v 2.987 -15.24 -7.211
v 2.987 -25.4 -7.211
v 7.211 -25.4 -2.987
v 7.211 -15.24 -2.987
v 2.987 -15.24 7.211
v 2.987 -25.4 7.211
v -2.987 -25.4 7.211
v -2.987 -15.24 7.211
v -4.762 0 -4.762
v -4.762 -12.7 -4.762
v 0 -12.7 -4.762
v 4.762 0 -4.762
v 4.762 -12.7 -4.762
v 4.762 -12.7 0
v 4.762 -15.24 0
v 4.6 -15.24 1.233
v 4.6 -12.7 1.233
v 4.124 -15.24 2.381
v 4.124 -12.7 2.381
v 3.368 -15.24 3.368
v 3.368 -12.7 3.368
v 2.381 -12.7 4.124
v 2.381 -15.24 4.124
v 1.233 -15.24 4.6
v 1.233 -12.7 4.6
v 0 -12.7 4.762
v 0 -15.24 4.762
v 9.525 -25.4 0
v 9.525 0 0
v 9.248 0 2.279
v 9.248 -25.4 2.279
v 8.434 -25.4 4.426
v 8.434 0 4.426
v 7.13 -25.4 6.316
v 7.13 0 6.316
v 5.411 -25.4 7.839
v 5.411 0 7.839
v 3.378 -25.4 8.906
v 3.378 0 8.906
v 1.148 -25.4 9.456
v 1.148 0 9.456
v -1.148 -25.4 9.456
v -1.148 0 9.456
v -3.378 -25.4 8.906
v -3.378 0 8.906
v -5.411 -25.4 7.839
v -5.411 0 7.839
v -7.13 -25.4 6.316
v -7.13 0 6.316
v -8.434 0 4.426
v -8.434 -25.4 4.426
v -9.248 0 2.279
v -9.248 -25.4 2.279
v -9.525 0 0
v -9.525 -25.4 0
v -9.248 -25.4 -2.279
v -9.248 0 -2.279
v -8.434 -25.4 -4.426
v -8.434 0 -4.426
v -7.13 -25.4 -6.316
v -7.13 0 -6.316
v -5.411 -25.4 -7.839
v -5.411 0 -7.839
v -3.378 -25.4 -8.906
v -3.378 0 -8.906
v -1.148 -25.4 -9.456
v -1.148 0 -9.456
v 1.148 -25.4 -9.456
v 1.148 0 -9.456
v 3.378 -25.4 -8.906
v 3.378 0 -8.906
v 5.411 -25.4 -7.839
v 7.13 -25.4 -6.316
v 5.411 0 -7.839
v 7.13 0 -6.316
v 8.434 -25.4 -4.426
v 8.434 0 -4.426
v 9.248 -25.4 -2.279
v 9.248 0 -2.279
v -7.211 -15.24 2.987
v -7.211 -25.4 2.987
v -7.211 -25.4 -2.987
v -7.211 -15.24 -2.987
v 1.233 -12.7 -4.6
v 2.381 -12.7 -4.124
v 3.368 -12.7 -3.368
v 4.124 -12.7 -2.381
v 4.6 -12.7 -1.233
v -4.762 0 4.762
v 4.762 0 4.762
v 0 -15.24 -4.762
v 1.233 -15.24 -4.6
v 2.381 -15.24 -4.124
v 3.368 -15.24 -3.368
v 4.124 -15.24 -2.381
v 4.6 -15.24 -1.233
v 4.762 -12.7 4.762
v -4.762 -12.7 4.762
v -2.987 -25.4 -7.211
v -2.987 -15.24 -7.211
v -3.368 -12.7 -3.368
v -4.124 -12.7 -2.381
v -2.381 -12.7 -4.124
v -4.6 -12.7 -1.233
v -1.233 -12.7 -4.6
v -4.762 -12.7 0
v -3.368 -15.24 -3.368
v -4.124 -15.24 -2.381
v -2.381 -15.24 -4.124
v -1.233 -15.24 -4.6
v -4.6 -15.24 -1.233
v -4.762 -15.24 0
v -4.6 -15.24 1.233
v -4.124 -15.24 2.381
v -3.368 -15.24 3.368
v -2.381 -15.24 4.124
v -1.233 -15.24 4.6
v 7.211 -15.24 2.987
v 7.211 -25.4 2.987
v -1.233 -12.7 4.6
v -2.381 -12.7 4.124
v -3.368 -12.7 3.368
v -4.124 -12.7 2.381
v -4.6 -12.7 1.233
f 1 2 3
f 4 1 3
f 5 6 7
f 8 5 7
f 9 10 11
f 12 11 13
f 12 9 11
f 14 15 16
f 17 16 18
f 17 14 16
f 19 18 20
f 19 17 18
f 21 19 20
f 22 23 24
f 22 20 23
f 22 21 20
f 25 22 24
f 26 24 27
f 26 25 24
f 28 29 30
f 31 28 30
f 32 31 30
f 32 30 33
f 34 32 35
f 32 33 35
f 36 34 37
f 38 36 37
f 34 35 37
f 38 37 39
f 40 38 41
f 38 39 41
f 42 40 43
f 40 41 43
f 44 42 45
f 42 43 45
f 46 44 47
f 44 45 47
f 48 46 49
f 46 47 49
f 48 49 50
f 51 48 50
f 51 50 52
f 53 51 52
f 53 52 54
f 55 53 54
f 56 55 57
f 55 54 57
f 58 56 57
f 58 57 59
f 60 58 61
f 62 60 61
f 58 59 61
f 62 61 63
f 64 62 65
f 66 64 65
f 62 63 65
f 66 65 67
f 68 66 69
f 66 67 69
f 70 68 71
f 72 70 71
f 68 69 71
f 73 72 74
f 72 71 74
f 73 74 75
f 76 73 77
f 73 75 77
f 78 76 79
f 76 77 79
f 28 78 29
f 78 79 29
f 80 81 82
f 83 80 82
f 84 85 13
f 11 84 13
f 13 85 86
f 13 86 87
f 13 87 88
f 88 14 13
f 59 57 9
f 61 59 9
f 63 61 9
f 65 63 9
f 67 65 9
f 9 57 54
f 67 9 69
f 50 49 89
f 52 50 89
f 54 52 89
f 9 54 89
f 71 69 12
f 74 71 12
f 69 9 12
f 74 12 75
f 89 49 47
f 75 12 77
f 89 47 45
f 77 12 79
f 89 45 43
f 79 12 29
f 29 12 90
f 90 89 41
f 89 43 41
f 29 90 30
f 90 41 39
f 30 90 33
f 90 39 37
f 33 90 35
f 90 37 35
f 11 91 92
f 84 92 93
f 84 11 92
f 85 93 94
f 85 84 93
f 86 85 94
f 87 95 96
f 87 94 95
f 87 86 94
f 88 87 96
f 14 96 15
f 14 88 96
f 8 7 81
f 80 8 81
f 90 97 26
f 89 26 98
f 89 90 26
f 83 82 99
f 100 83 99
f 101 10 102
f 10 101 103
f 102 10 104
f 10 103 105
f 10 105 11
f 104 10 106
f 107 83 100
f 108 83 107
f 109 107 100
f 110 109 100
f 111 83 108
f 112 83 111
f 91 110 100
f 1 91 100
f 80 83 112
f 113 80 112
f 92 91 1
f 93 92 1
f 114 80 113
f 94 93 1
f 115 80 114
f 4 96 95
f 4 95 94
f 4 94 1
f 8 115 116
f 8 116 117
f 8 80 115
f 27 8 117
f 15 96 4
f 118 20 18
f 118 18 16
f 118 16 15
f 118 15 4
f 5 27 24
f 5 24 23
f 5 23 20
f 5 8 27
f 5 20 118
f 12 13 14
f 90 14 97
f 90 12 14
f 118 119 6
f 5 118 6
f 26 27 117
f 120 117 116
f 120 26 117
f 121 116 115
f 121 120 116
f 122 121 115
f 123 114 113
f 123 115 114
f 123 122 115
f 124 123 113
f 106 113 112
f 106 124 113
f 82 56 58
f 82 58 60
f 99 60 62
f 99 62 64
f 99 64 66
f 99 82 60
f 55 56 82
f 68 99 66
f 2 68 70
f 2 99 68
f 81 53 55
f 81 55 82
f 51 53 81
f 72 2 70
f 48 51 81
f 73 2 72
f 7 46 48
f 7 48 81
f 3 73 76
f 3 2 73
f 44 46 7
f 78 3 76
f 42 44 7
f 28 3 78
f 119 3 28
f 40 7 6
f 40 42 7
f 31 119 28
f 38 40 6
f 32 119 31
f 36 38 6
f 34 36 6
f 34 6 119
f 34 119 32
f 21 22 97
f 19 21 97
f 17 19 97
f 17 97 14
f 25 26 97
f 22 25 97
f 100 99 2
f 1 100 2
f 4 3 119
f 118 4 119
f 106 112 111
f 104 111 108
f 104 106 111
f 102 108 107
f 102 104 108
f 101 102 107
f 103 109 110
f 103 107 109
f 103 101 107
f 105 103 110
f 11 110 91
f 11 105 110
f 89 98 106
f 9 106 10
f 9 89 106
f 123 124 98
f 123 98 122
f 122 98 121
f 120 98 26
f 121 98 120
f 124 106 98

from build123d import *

# Parameters (mm, degrees)
F0_R     = 9.525
F1_DEPTH = 25.4
F3_DEPTH = 25.401
F4_DEPTH = 12.7
F6_DEPTH = 10.16


with BuildPart() as f1:
    # F0 (on Front) → F1 (new body)
    with BuildSketch(Plane.XZ):
        Circle(F0_R)
    extrude(amount=F1_DEPTH)

    # F2 (on Front) → F3 (cut, through all)
    with BuildSketch(Plane.XZ):
        with BuildLine():
            ThreePointArc((4.7625, 0), (3.367596, 3.367596), (0, 4.7625))
            ThreePointArc((0, 4.7625), (-3.367596, 3.367596), (-4.7625, 0))
            ThreePointArc((-4.7625, 0), (-3.367596, -3.367596), (0, -4.7625))
            ThreePointArc((0, -4.7625), (3.367596, -3.367596), (4.7625, 0))
        make_face()
    extrude(amount=F3_DEPTH, mode=Mode.SUBTRACT)

    # F2 (on Front) → F4 (cut)
    with BuildSketch(Plane.XZ):
        with BuildLine():
            Line((4.7625, 0), (4.7625, 4.7625))
            Line((4.7625, 4.7625), (0, 4.7625))
            ThreePointArc((0, 4.7625), (3.367596, 3.367596), (4.7625, 0))
        make_face()
        with BuildLine():
            ThreePointArc((-4.7625, 0), (-3.367596, 3.367596), (0, 4.7625))
            Line((0, 4.7625), (-4.7625, 4.7625))
            Line((-4.7625, 4.7625), (-4.7625, 0))
        make_face()
        with BuildLine():
            Line((4.7625, -4.7625), (4.7625, 0))
            ThreePointArc((4.7625, 0), (3.367596, -3.367596), (0, -4.7625))
            Line((0, -4.7625), (4.7625, -4.7625))
        make_face()
        with BuildLine():
            ThreePointArc((0, -4.7625), (-3.367596, -3.367596), (-4.7625, 0))
            Line((-4.7625, 0), (-4.7625, -4.7625))
            Line((-4.7625, -4.7625), (0, -4.7625))
        make_face()
    extrude(amount=F4_DEPTH, mode=Mode.SUBTRACT)

    # F5 (on face) → F6 (cut)
    with BuildSketch(Plane.XZ.offset(25.4)):
        Polygon((2.986736, 7.210618), (-2.986736, 7.210618), (-7.210618, 2.986736), (-7.210618, -2.986736), (-2.986736, -7.210618), (2.986736, -7.210618), (7.210618, -2.986736), (7.210618, 2.986736), align=None)
    extrude(amount=-F6_DEPTH, mode=Mode.SUBTRACT)


solid = f1.part
